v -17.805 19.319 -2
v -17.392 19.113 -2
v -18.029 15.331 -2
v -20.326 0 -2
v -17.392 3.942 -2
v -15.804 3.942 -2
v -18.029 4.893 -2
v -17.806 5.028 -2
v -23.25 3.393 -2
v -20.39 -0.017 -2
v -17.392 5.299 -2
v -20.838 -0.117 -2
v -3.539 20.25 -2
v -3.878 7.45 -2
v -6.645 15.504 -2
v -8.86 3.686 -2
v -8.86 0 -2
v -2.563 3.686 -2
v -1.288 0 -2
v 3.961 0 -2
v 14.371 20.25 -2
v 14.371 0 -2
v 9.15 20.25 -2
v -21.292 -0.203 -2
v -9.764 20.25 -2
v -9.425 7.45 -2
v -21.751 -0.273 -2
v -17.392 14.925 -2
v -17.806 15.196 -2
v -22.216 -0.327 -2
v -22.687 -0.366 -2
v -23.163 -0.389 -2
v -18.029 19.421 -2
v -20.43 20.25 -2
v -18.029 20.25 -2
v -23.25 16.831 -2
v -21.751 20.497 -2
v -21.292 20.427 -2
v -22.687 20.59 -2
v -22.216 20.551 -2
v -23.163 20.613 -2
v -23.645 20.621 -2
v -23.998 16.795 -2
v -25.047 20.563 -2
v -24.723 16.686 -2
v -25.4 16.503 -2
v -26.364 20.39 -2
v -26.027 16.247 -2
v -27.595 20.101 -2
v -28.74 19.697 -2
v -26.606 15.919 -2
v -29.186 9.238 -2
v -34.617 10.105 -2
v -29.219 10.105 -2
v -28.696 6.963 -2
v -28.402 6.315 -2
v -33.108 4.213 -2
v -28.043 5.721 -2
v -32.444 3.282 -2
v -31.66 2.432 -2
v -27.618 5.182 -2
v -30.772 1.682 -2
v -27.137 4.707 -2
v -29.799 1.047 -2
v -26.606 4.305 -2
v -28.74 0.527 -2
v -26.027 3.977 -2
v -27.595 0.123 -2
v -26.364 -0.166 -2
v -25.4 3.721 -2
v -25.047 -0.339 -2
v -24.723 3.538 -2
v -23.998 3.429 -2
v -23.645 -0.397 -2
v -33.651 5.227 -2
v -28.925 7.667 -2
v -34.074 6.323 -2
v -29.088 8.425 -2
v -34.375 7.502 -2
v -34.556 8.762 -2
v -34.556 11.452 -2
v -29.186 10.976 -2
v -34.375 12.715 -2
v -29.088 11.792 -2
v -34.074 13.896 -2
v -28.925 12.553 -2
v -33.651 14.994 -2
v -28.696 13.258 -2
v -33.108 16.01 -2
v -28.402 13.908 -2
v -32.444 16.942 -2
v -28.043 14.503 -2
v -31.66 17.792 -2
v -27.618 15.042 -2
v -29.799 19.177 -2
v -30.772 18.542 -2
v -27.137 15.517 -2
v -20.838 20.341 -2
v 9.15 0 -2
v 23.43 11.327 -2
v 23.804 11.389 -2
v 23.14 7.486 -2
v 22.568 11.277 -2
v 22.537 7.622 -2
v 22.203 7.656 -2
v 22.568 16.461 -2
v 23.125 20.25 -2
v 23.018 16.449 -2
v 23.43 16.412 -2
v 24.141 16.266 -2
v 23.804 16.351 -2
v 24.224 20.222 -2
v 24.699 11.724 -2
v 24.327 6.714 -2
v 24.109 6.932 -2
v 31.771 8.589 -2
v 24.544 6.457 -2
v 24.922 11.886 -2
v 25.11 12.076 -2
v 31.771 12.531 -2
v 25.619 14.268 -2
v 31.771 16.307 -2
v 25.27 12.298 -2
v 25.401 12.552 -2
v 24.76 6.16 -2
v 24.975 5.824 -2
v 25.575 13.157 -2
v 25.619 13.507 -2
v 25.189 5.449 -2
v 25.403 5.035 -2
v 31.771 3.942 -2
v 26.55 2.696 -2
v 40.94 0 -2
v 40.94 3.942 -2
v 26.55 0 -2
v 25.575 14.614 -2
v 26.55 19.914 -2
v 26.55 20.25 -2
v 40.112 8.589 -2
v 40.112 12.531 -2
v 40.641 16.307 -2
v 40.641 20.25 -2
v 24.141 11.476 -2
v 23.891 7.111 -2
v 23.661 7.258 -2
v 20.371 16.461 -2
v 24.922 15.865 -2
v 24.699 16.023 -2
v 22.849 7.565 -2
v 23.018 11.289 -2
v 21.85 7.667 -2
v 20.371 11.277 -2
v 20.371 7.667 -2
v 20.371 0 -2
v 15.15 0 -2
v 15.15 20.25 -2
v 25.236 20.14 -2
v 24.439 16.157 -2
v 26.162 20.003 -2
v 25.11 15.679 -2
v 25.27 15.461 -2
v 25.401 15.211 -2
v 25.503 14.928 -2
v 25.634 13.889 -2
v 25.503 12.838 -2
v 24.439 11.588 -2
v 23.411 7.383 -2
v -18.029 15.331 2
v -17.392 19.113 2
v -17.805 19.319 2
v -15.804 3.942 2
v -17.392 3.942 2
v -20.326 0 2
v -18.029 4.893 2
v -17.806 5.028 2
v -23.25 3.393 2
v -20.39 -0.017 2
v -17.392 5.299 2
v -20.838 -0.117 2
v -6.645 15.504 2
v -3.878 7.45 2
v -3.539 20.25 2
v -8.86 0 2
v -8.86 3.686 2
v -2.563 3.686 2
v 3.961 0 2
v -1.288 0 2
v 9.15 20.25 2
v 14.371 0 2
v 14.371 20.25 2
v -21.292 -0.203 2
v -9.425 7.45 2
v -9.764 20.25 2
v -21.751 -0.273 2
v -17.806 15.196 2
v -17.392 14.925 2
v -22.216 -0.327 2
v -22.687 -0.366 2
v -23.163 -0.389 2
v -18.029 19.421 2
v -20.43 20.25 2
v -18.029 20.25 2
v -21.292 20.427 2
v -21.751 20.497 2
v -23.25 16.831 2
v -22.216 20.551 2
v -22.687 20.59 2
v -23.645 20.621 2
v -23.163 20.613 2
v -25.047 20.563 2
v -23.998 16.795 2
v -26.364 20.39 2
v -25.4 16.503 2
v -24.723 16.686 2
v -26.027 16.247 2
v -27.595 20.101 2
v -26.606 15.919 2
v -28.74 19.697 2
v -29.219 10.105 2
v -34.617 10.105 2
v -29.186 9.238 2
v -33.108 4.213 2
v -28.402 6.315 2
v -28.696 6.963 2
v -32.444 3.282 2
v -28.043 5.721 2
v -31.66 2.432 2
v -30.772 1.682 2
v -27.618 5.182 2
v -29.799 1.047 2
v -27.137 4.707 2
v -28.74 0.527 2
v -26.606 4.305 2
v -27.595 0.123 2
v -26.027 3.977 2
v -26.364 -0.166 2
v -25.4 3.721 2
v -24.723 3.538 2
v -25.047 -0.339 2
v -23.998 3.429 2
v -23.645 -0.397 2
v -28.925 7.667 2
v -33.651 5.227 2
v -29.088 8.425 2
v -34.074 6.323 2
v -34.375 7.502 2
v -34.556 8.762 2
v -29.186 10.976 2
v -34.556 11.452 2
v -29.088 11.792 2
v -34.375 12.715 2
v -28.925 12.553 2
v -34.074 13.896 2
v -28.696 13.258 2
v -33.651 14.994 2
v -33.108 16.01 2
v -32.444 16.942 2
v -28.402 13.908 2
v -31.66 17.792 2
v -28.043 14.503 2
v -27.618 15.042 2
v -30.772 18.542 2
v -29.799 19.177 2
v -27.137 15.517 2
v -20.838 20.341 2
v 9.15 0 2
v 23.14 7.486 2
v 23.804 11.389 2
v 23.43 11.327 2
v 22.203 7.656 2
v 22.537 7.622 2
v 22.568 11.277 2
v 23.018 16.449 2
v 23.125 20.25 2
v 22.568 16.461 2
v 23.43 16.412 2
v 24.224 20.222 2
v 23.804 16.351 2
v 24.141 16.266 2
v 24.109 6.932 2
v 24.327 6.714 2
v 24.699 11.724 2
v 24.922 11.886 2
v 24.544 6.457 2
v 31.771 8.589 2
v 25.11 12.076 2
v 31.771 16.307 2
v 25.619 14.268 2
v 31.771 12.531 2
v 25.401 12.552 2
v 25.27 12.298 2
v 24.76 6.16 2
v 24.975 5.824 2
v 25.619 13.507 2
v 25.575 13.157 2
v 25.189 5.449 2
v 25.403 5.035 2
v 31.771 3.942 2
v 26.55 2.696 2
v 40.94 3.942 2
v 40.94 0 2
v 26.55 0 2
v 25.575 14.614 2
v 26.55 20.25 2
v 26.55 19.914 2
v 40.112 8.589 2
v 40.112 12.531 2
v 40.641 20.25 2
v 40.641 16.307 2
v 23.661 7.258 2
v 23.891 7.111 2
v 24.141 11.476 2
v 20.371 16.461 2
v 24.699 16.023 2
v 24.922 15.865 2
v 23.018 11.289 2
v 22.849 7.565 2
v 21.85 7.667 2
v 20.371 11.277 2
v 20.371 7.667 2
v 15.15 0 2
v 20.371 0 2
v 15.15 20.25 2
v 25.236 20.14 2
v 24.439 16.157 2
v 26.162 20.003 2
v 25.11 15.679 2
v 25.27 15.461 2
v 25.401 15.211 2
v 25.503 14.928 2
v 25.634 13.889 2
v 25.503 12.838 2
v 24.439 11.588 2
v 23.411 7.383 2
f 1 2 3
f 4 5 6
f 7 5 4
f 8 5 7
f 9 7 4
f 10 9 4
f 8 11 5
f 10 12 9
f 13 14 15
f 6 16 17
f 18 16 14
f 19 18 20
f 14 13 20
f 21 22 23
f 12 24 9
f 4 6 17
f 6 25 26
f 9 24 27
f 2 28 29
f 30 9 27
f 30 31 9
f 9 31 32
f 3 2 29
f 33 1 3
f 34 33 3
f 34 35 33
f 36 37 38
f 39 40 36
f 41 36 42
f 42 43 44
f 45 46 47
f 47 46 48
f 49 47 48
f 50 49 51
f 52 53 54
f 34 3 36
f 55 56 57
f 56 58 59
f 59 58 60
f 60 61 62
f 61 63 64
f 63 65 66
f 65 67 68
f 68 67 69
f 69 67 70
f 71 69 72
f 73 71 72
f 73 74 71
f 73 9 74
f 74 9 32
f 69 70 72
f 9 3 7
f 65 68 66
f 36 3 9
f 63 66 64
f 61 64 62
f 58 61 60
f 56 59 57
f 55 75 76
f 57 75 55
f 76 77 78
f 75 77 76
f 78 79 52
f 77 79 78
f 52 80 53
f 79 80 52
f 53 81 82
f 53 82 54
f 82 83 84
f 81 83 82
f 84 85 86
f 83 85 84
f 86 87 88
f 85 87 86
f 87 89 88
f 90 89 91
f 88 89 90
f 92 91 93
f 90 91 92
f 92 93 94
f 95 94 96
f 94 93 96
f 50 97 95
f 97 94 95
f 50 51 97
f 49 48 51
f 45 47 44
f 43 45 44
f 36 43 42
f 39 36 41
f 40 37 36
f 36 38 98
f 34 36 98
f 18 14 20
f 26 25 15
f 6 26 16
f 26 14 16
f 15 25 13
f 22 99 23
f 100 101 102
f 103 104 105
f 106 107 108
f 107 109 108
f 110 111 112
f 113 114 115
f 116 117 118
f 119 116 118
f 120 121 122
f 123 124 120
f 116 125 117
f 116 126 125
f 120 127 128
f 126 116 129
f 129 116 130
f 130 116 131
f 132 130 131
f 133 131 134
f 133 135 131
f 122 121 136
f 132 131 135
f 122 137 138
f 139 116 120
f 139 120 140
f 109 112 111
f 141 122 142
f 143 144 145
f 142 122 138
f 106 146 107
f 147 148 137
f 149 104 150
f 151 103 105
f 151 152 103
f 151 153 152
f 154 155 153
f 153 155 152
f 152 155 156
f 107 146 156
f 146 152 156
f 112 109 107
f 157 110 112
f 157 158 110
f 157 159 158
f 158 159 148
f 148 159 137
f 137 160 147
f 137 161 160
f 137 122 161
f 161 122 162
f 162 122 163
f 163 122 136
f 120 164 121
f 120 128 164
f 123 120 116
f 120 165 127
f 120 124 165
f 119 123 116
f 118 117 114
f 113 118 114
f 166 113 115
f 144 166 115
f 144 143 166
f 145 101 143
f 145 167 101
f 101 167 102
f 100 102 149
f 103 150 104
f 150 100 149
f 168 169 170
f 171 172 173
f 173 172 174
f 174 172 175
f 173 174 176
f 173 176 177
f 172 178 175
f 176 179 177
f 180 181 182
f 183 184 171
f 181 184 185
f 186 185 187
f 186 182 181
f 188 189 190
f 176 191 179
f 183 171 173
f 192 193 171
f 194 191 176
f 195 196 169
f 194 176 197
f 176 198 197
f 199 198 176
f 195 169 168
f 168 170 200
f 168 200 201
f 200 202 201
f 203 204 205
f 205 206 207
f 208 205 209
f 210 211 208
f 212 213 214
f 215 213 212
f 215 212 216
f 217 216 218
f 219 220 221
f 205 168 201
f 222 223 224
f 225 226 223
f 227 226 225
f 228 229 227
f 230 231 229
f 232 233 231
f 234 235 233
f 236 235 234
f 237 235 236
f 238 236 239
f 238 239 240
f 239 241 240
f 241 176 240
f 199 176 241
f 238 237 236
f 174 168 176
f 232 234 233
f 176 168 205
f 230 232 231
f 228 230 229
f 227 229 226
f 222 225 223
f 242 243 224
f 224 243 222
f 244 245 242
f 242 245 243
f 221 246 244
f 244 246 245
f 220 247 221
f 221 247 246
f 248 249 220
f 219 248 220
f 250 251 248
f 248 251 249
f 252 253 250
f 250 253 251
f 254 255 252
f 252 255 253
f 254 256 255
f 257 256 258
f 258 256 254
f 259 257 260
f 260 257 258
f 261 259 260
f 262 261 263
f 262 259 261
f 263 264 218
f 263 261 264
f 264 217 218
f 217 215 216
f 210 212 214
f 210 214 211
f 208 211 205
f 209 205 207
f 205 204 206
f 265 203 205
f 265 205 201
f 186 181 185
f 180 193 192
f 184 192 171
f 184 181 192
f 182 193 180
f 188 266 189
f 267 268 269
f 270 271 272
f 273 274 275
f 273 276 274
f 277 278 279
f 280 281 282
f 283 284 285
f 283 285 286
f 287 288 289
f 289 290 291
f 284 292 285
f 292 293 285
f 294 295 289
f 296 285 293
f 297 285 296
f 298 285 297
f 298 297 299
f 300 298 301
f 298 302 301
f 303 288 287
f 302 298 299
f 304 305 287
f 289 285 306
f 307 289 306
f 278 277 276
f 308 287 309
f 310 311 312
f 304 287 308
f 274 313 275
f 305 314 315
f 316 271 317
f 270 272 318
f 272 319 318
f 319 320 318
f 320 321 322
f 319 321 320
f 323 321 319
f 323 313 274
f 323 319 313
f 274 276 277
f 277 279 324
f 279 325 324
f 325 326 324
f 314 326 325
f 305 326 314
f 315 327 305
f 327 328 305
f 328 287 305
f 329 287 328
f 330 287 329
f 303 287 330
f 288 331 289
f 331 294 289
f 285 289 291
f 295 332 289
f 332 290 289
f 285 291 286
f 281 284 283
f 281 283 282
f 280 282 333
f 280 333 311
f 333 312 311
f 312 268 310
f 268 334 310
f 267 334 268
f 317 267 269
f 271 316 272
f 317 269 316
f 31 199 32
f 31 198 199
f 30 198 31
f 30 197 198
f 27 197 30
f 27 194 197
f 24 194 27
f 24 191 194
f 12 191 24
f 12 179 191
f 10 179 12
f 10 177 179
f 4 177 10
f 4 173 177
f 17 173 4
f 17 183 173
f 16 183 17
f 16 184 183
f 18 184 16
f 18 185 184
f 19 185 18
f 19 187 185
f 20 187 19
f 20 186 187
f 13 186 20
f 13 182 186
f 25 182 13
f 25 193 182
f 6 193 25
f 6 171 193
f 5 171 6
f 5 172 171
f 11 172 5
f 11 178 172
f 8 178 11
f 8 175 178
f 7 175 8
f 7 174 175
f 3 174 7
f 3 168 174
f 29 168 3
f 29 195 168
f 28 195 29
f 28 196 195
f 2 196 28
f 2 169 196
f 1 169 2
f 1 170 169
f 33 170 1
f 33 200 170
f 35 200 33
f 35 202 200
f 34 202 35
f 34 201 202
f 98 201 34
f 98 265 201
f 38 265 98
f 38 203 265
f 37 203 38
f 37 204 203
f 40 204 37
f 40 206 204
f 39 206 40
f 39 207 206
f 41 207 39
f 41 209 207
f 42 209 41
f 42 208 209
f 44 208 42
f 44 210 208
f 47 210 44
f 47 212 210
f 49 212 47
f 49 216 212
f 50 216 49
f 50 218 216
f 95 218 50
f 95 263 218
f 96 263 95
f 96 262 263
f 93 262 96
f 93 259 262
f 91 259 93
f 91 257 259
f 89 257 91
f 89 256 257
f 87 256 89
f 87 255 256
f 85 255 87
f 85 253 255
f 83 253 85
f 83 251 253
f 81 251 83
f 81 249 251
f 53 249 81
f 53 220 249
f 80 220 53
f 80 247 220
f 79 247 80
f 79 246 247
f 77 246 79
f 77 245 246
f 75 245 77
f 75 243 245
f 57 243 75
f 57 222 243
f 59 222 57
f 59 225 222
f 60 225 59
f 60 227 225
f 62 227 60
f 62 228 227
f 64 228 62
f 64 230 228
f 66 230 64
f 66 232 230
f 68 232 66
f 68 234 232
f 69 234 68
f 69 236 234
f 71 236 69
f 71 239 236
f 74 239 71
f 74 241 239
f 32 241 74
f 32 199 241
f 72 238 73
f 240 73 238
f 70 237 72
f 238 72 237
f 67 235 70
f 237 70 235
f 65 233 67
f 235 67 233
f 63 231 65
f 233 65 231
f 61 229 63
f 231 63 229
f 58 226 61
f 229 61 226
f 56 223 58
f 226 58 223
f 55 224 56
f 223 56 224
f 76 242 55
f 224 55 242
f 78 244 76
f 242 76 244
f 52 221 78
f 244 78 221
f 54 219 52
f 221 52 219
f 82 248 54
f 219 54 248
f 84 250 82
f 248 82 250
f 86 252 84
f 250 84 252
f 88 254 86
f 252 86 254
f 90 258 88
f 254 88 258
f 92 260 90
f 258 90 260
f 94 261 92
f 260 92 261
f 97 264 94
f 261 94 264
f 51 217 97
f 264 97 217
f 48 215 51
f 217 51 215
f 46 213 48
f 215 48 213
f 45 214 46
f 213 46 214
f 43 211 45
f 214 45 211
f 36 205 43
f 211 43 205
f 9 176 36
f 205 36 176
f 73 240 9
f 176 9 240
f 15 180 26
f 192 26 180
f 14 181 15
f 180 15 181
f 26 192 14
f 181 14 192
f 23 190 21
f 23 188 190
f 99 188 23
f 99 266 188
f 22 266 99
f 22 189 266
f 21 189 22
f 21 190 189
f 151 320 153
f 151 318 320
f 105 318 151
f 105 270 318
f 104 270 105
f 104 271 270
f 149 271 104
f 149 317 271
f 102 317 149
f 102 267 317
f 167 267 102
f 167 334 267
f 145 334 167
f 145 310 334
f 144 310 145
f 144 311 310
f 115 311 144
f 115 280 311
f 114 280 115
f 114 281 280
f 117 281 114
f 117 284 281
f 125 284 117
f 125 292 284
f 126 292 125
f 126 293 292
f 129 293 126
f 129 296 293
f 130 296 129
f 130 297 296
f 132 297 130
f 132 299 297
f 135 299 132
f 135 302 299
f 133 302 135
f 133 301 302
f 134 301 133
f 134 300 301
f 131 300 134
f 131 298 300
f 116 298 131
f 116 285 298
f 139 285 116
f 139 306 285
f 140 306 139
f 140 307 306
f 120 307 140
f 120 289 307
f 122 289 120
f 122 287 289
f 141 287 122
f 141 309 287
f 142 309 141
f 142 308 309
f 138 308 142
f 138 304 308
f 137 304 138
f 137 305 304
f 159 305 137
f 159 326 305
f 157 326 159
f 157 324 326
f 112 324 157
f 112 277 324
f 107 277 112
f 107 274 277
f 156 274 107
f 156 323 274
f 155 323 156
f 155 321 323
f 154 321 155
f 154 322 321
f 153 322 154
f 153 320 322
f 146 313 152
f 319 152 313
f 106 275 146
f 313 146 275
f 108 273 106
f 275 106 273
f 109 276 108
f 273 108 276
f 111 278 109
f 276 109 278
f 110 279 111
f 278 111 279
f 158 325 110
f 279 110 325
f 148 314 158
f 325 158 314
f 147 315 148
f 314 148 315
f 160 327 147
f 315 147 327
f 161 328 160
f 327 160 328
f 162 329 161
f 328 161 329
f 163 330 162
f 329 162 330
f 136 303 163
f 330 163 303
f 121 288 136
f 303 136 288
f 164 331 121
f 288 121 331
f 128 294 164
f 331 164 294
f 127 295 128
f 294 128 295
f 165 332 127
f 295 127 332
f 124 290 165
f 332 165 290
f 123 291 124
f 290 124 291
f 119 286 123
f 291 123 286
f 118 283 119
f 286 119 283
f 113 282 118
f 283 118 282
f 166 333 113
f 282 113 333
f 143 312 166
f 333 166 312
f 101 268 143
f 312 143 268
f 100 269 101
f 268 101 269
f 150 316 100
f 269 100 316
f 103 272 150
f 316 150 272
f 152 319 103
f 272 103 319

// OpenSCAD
// Basic parameters
$fn = 50;  // Smoothness of curves

// Text parameters
text_height = 20;      // Height of the text
extrusion_depth = 4;   // How thick/deep the text will be

// Individual letter spacing adjustments
c_l_spacing = .85;    // Space between C and L
l_a_spacing = 0.7;    // Space between L and A
a_i_spacing = 2;    // Space between A and I
i_r_spacing = 0.5;    // Space between I and R
r_e_spacing = .95;    // Space between R and E

// Font parameters
font = "Miju:style=Bold";  // Using Miju font

// Create the 3D text by combining individual letters
linear_extrude(height = extrusion_depth, center = true) {
    translate([0, 0, 0]) {
        // Calculate total width for centering
        total_width = 
            len("C") * text_height * 0.6 +
            len("L") * text_height * 0.6 * (c_l_spacing) +
            len("A") * text_height * 0.6 * (l_a_spacing) +
            len("I") * text_height * 0.6 * (a_i_spacing) +
            len("R") * text_height * 0.6 * (i_r_spacing) +
            len("E") * text_height * 0.6 * (r_e_spacing);
        
        // Center the entire text
        translate([-total_width/2, 0, 0]) {
            // Individual letters with custom spacing
            text("C", size = text_height, font = font);
            translate([text_height * 0.6 * (c_l_spacing), 0, 0])
                text("L", size = text_height, font = font);
            translate([text_height * 0.6 * (c_l_spacing + l_a_spacing), 0, 0])
                text("A", size = text_height, font = font);
            translate([text_height * 0.6 * (c_l_spacing + l_a_spacing + a_i_spacing), 0, 0])
                text("I", size = text_height, font = font);
            translate([text_height * 0.6 * (c_l_spacing + l_a_spacing + a_i_spacing + i_r_spacing), 0, 0])
                text("R", size = text_height, font = font);
            translate([text_height * 0.6 * (c_l_spacing + l_a_spacing + a_i_spacing + i_r_spacing + r_e_spacing), 0, 0])
                text("E", size = text_height, font = font);
        }
    }
}

// Optional: Add a base plate
// Uncomment these lines if you want a base plate
/*
translate([0, 0, -extrusion_depth/2 - 1])
    cube([text_height * 3.5, text_height * 1.2, 2], center = true);
*/ 
